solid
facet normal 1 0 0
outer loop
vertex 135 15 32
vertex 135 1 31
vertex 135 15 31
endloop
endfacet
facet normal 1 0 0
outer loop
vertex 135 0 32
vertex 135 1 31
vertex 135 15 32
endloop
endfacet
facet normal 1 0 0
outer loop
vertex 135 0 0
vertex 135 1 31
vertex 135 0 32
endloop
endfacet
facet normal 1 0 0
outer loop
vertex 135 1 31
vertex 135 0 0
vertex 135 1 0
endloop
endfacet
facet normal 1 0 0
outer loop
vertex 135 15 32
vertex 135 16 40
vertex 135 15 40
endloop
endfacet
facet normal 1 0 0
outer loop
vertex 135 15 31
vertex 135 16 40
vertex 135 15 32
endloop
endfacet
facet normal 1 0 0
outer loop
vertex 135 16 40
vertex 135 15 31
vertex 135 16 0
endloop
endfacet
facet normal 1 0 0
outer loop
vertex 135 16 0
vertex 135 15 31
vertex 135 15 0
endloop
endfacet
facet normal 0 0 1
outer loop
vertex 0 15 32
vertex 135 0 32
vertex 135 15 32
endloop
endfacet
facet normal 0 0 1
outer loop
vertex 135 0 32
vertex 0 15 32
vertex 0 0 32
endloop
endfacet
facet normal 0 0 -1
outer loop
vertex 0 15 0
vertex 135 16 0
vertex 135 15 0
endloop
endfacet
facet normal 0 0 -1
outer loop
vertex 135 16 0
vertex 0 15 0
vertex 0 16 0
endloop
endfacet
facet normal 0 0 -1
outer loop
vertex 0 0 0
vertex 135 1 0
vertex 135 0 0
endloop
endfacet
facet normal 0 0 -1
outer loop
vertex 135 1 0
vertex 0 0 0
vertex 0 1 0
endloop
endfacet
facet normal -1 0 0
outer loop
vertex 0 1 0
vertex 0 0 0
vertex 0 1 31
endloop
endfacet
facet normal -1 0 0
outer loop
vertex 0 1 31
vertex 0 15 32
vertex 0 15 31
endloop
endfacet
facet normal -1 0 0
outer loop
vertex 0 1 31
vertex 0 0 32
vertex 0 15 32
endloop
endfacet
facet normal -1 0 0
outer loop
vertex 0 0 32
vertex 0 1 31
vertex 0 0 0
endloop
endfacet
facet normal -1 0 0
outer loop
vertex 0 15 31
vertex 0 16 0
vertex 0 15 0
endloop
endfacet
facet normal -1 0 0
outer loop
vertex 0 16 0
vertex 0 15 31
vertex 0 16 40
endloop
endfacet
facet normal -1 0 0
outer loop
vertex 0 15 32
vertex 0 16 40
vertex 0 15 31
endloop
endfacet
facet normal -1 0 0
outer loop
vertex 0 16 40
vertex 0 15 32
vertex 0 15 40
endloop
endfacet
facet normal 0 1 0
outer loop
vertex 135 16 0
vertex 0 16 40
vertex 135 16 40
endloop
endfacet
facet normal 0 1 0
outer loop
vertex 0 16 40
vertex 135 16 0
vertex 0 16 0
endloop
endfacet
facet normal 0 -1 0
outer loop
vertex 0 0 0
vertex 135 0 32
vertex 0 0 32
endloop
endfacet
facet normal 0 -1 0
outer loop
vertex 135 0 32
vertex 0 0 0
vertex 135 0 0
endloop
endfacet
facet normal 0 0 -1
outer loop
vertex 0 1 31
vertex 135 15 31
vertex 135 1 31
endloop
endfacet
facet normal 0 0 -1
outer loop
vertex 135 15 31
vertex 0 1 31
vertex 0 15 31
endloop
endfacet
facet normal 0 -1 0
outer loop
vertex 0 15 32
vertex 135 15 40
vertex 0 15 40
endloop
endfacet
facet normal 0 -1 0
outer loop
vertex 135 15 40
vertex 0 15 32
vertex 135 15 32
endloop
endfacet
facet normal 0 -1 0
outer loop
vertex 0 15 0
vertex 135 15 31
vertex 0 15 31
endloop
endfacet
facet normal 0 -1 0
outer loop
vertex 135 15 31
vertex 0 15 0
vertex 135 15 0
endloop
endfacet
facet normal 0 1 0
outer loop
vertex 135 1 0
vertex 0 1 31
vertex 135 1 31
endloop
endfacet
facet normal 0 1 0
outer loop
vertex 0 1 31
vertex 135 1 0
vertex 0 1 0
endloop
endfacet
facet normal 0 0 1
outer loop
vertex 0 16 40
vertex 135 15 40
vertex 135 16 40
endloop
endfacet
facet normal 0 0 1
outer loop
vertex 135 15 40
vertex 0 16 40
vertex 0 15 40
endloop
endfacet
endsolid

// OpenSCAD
// In mm
back_height = 40;
front_height = 32;
width_of_medicine_cabinet = 270;
width_spacer = width_of_medicine_cabinet / 2;
width_separator = width_of_medicine_cabinet / 4;
depth = 16;
separator_depth = 48;
thickness = 1;

module back_face(width) {
    cube([width, thickness, back_height]);
}

module hump(width) {
    difference() {
    cube([width, depth, front_height]);
    translate([-1,thickness,-thickness])
    cube([width + 2, depth - thickness * 2, front_height]);
    }
}

module separator() {
    cube([thickness, separator_depth, back_height]);
}

module print_spacer() {
    union() {
        hump(width_spacer);
        translate([0, depth - thickness, 0])
        back_face(width_spacer);
    }
}

module print_separator() {
    union() {
        hump(width_separator);
        translate([0, depth - thickness, 0])
        back_face(width_separator);
        translate([width_separator - thickness, depth, 0])
        separator();
    }
}

// For optimal positioning for printing, uncomment
// the rotate
//rotate([0,90,0])
// Uncomment one of the following
print_spacer();
//print_separator();
